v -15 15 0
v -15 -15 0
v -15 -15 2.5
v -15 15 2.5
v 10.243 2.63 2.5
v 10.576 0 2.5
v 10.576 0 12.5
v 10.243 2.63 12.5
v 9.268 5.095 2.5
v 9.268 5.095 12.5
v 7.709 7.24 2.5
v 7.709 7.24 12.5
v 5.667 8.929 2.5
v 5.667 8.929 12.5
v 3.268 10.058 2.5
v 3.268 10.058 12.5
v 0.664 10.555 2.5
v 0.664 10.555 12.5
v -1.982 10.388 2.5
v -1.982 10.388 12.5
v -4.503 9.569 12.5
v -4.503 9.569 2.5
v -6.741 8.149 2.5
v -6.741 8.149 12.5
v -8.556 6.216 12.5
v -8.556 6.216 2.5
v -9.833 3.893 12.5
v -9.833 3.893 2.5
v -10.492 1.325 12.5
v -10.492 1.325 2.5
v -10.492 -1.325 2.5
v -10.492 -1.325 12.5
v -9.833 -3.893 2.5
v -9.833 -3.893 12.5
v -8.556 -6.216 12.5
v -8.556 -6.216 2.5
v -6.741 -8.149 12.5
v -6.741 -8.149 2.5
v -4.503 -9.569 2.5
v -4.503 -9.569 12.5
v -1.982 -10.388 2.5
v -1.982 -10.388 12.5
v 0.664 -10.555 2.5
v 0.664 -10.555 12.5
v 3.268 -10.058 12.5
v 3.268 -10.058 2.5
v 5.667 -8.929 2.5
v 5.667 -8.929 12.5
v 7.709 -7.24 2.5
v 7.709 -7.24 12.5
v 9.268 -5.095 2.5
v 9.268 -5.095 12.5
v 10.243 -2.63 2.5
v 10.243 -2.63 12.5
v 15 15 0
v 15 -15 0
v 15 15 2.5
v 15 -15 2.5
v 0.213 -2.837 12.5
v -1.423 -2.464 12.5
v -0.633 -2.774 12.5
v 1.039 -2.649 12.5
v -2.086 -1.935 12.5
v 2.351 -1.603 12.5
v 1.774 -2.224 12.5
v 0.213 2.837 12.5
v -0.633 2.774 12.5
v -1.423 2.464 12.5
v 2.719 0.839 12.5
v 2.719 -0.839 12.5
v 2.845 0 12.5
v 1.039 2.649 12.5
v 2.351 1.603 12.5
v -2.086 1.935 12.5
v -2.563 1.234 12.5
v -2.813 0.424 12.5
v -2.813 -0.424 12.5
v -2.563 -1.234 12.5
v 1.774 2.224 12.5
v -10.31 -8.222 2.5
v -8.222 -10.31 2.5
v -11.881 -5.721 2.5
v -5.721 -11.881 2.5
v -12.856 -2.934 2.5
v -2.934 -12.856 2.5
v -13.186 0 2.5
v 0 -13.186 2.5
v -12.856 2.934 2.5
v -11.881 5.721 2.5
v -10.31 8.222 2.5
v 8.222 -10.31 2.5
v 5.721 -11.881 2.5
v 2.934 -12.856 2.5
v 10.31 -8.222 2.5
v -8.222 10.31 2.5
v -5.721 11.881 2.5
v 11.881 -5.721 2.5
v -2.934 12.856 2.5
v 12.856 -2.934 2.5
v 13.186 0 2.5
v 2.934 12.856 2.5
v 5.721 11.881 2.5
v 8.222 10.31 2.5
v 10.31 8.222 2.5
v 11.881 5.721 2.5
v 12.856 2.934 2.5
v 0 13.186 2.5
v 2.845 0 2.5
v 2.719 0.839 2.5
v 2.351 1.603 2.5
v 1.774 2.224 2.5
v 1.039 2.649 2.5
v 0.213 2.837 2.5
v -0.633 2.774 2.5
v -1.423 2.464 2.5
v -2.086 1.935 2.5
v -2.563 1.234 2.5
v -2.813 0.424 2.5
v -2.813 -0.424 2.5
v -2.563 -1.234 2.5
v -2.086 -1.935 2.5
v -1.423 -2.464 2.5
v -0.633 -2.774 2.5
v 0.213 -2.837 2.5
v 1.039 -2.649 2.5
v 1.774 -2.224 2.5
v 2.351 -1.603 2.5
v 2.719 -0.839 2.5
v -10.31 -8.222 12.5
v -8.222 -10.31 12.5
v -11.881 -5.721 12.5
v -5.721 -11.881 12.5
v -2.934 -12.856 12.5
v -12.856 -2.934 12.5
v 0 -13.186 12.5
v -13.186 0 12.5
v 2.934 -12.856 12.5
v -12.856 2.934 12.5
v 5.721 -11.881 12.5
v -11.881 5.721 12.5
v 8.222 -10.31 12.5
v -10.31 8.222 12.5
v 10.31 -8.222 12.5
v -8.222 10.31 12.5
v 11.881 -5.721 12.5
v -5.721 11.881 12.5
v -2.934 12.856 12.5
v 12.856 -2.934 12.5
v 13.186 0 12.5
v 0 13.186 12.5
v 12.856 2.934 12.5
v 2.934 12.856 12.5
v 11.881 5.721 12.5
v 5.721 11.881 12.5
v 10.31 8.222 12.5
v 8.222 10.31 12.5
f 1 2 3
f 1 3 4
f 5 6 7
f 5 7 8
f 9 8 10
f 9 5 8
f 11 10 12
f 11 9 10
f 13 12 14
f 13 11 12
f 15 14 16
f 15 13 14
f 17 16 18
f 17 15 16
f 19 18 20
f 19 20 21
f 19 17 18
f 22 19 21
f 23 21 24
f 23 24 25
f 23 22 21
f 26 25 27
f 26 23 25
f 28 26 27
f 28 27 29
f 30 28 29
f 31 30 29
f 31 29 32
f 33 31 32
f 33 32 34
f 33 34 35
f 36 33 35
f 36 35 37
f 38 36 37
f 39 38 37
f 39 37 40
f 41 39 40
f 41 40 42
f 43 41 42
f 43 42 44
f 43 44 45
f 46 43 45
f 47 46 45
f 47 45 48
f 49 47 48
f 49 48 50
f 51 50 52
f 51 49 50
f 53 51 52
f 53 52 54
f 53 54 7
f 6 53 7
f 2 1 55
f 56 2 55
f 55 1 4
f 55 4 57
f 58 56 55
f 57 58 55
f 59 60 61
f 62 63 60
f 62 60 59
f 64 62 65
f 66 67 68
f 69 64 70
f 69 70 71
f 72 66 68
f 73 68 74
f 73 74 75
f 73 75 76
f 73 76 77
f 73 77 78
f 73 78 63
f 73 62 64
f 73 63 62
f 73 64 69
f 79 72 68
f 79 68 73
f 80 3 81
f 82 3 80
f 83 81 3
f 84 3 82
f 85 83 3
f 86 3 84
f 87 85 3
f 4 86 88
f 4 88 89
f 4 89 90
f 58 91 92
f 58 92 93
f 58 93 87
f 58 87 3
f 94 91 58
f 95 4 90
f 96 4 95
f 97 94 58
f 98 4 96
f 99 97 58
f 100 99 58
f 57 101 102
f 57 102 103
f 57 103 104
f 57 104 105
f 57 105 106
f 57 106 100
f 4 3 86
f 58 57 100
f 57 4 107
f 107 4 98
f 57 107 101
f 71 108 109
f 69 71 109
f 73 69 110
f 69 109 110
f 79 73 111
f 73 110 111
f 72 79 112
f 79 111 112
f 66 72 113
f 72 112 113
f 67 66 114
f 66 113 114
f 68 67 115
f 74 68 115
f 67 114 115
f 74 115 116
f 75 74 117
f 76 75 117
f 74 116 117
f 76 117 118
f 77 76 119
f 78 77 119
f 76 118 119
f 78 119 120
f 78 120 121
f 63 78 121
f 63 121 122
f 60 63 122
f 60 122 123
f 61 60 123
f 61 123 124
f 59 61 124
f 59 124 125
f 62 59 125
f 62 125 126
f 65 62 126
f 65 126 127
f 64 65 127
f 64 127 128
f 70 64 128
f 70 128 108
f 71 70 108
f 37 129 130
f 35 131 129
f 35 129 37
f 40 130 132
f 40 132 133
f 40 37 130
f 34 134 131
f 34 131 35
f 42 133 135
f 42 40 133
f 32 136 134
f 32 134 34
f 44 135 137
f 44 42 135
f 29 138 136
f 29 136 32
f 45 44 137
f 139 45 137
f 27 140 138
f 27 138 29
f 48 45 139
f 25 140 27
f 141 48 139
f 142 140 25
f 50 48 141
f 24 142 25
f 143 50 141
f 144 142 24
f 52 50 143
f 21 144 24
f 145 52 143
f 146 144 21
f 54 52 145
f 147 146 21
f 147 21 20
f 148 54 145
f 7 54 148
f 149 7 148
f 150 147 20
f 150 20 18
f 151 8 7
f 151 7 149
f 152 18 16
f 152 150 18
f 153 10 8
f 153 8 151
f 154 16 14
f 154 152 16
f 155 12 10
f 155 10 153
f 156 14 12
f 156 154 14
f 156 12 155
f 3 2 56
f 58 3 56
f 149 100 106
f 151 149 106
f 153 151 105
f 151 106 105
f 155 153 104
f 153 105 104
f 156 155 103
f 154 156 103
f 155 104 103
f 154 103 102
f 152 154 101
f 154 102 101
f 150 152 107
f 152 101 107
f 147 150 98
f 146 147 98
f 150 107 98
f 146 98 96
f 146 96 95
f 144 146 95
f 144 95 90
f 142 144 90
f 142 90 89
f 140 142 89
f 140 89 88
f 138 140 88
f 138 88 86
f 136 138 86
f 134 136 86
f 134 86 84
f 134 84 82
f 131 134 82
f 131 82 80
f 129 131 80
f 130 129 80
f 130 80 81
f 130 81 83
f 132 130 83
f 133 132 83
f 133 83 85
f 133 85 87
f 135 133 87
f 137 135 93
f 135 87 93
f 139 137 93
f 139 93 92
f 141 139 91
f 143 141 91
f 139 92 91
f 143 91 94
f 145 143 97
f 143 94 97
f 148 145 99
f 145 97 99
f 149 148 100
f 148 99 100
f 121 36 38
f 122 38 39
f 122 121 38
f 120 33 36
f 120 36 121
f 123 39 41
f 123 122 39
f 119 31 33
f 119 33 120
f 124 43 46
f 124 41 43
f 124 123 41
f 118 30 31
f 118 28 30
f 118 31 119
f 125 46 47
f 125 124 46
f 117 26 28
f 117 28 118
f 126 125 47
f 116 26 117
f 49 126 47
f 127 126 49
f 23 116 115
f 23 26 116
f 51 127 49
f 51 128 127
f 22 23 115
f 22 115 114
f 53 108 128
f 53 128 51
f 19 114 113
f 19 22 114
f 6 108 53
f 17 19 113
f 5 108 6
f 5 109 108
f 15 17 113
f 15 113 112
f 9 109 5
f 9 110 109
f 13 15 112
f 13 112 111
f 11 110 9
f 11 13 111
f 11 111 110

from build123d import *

# Parameters (mm, degrees)
F0_W     = 30
F0_H     = 30
F1_DEPTH = 2.5
F2_R     = 2.8452020341
F3_DEPTH = 12.5
F4_R     = 13.1863944163
F4_R_2   = 10.5757052103
F5_DEPTH = 12.5


# Not quite as in the source:
# - a feature names something its author has since deleted; it is built from what else it names


with BuildPart() as f1:
    # F0 (on Top) → F1 (new body)
    with BuildSketch(Plane.XY):
        Rectangle(F0_W, F0_H)
    extrude(amount=F1_DEPTH)

    # F2 (on Top) → F3 (join)
    with BuildSketch(Plane.XY):
        Circle(F2_R)
    extrude(amount=F3_DEPTH)

    # F4 (on Top) → F5 (join)
    with BuildSketch(Plane.XY):
        Circle(F4_R)
        Circle(F4_R_2, mode=Mode.SUBTRACT)
    extrude(amount=F5_DEPTH)


solid = f1.part
